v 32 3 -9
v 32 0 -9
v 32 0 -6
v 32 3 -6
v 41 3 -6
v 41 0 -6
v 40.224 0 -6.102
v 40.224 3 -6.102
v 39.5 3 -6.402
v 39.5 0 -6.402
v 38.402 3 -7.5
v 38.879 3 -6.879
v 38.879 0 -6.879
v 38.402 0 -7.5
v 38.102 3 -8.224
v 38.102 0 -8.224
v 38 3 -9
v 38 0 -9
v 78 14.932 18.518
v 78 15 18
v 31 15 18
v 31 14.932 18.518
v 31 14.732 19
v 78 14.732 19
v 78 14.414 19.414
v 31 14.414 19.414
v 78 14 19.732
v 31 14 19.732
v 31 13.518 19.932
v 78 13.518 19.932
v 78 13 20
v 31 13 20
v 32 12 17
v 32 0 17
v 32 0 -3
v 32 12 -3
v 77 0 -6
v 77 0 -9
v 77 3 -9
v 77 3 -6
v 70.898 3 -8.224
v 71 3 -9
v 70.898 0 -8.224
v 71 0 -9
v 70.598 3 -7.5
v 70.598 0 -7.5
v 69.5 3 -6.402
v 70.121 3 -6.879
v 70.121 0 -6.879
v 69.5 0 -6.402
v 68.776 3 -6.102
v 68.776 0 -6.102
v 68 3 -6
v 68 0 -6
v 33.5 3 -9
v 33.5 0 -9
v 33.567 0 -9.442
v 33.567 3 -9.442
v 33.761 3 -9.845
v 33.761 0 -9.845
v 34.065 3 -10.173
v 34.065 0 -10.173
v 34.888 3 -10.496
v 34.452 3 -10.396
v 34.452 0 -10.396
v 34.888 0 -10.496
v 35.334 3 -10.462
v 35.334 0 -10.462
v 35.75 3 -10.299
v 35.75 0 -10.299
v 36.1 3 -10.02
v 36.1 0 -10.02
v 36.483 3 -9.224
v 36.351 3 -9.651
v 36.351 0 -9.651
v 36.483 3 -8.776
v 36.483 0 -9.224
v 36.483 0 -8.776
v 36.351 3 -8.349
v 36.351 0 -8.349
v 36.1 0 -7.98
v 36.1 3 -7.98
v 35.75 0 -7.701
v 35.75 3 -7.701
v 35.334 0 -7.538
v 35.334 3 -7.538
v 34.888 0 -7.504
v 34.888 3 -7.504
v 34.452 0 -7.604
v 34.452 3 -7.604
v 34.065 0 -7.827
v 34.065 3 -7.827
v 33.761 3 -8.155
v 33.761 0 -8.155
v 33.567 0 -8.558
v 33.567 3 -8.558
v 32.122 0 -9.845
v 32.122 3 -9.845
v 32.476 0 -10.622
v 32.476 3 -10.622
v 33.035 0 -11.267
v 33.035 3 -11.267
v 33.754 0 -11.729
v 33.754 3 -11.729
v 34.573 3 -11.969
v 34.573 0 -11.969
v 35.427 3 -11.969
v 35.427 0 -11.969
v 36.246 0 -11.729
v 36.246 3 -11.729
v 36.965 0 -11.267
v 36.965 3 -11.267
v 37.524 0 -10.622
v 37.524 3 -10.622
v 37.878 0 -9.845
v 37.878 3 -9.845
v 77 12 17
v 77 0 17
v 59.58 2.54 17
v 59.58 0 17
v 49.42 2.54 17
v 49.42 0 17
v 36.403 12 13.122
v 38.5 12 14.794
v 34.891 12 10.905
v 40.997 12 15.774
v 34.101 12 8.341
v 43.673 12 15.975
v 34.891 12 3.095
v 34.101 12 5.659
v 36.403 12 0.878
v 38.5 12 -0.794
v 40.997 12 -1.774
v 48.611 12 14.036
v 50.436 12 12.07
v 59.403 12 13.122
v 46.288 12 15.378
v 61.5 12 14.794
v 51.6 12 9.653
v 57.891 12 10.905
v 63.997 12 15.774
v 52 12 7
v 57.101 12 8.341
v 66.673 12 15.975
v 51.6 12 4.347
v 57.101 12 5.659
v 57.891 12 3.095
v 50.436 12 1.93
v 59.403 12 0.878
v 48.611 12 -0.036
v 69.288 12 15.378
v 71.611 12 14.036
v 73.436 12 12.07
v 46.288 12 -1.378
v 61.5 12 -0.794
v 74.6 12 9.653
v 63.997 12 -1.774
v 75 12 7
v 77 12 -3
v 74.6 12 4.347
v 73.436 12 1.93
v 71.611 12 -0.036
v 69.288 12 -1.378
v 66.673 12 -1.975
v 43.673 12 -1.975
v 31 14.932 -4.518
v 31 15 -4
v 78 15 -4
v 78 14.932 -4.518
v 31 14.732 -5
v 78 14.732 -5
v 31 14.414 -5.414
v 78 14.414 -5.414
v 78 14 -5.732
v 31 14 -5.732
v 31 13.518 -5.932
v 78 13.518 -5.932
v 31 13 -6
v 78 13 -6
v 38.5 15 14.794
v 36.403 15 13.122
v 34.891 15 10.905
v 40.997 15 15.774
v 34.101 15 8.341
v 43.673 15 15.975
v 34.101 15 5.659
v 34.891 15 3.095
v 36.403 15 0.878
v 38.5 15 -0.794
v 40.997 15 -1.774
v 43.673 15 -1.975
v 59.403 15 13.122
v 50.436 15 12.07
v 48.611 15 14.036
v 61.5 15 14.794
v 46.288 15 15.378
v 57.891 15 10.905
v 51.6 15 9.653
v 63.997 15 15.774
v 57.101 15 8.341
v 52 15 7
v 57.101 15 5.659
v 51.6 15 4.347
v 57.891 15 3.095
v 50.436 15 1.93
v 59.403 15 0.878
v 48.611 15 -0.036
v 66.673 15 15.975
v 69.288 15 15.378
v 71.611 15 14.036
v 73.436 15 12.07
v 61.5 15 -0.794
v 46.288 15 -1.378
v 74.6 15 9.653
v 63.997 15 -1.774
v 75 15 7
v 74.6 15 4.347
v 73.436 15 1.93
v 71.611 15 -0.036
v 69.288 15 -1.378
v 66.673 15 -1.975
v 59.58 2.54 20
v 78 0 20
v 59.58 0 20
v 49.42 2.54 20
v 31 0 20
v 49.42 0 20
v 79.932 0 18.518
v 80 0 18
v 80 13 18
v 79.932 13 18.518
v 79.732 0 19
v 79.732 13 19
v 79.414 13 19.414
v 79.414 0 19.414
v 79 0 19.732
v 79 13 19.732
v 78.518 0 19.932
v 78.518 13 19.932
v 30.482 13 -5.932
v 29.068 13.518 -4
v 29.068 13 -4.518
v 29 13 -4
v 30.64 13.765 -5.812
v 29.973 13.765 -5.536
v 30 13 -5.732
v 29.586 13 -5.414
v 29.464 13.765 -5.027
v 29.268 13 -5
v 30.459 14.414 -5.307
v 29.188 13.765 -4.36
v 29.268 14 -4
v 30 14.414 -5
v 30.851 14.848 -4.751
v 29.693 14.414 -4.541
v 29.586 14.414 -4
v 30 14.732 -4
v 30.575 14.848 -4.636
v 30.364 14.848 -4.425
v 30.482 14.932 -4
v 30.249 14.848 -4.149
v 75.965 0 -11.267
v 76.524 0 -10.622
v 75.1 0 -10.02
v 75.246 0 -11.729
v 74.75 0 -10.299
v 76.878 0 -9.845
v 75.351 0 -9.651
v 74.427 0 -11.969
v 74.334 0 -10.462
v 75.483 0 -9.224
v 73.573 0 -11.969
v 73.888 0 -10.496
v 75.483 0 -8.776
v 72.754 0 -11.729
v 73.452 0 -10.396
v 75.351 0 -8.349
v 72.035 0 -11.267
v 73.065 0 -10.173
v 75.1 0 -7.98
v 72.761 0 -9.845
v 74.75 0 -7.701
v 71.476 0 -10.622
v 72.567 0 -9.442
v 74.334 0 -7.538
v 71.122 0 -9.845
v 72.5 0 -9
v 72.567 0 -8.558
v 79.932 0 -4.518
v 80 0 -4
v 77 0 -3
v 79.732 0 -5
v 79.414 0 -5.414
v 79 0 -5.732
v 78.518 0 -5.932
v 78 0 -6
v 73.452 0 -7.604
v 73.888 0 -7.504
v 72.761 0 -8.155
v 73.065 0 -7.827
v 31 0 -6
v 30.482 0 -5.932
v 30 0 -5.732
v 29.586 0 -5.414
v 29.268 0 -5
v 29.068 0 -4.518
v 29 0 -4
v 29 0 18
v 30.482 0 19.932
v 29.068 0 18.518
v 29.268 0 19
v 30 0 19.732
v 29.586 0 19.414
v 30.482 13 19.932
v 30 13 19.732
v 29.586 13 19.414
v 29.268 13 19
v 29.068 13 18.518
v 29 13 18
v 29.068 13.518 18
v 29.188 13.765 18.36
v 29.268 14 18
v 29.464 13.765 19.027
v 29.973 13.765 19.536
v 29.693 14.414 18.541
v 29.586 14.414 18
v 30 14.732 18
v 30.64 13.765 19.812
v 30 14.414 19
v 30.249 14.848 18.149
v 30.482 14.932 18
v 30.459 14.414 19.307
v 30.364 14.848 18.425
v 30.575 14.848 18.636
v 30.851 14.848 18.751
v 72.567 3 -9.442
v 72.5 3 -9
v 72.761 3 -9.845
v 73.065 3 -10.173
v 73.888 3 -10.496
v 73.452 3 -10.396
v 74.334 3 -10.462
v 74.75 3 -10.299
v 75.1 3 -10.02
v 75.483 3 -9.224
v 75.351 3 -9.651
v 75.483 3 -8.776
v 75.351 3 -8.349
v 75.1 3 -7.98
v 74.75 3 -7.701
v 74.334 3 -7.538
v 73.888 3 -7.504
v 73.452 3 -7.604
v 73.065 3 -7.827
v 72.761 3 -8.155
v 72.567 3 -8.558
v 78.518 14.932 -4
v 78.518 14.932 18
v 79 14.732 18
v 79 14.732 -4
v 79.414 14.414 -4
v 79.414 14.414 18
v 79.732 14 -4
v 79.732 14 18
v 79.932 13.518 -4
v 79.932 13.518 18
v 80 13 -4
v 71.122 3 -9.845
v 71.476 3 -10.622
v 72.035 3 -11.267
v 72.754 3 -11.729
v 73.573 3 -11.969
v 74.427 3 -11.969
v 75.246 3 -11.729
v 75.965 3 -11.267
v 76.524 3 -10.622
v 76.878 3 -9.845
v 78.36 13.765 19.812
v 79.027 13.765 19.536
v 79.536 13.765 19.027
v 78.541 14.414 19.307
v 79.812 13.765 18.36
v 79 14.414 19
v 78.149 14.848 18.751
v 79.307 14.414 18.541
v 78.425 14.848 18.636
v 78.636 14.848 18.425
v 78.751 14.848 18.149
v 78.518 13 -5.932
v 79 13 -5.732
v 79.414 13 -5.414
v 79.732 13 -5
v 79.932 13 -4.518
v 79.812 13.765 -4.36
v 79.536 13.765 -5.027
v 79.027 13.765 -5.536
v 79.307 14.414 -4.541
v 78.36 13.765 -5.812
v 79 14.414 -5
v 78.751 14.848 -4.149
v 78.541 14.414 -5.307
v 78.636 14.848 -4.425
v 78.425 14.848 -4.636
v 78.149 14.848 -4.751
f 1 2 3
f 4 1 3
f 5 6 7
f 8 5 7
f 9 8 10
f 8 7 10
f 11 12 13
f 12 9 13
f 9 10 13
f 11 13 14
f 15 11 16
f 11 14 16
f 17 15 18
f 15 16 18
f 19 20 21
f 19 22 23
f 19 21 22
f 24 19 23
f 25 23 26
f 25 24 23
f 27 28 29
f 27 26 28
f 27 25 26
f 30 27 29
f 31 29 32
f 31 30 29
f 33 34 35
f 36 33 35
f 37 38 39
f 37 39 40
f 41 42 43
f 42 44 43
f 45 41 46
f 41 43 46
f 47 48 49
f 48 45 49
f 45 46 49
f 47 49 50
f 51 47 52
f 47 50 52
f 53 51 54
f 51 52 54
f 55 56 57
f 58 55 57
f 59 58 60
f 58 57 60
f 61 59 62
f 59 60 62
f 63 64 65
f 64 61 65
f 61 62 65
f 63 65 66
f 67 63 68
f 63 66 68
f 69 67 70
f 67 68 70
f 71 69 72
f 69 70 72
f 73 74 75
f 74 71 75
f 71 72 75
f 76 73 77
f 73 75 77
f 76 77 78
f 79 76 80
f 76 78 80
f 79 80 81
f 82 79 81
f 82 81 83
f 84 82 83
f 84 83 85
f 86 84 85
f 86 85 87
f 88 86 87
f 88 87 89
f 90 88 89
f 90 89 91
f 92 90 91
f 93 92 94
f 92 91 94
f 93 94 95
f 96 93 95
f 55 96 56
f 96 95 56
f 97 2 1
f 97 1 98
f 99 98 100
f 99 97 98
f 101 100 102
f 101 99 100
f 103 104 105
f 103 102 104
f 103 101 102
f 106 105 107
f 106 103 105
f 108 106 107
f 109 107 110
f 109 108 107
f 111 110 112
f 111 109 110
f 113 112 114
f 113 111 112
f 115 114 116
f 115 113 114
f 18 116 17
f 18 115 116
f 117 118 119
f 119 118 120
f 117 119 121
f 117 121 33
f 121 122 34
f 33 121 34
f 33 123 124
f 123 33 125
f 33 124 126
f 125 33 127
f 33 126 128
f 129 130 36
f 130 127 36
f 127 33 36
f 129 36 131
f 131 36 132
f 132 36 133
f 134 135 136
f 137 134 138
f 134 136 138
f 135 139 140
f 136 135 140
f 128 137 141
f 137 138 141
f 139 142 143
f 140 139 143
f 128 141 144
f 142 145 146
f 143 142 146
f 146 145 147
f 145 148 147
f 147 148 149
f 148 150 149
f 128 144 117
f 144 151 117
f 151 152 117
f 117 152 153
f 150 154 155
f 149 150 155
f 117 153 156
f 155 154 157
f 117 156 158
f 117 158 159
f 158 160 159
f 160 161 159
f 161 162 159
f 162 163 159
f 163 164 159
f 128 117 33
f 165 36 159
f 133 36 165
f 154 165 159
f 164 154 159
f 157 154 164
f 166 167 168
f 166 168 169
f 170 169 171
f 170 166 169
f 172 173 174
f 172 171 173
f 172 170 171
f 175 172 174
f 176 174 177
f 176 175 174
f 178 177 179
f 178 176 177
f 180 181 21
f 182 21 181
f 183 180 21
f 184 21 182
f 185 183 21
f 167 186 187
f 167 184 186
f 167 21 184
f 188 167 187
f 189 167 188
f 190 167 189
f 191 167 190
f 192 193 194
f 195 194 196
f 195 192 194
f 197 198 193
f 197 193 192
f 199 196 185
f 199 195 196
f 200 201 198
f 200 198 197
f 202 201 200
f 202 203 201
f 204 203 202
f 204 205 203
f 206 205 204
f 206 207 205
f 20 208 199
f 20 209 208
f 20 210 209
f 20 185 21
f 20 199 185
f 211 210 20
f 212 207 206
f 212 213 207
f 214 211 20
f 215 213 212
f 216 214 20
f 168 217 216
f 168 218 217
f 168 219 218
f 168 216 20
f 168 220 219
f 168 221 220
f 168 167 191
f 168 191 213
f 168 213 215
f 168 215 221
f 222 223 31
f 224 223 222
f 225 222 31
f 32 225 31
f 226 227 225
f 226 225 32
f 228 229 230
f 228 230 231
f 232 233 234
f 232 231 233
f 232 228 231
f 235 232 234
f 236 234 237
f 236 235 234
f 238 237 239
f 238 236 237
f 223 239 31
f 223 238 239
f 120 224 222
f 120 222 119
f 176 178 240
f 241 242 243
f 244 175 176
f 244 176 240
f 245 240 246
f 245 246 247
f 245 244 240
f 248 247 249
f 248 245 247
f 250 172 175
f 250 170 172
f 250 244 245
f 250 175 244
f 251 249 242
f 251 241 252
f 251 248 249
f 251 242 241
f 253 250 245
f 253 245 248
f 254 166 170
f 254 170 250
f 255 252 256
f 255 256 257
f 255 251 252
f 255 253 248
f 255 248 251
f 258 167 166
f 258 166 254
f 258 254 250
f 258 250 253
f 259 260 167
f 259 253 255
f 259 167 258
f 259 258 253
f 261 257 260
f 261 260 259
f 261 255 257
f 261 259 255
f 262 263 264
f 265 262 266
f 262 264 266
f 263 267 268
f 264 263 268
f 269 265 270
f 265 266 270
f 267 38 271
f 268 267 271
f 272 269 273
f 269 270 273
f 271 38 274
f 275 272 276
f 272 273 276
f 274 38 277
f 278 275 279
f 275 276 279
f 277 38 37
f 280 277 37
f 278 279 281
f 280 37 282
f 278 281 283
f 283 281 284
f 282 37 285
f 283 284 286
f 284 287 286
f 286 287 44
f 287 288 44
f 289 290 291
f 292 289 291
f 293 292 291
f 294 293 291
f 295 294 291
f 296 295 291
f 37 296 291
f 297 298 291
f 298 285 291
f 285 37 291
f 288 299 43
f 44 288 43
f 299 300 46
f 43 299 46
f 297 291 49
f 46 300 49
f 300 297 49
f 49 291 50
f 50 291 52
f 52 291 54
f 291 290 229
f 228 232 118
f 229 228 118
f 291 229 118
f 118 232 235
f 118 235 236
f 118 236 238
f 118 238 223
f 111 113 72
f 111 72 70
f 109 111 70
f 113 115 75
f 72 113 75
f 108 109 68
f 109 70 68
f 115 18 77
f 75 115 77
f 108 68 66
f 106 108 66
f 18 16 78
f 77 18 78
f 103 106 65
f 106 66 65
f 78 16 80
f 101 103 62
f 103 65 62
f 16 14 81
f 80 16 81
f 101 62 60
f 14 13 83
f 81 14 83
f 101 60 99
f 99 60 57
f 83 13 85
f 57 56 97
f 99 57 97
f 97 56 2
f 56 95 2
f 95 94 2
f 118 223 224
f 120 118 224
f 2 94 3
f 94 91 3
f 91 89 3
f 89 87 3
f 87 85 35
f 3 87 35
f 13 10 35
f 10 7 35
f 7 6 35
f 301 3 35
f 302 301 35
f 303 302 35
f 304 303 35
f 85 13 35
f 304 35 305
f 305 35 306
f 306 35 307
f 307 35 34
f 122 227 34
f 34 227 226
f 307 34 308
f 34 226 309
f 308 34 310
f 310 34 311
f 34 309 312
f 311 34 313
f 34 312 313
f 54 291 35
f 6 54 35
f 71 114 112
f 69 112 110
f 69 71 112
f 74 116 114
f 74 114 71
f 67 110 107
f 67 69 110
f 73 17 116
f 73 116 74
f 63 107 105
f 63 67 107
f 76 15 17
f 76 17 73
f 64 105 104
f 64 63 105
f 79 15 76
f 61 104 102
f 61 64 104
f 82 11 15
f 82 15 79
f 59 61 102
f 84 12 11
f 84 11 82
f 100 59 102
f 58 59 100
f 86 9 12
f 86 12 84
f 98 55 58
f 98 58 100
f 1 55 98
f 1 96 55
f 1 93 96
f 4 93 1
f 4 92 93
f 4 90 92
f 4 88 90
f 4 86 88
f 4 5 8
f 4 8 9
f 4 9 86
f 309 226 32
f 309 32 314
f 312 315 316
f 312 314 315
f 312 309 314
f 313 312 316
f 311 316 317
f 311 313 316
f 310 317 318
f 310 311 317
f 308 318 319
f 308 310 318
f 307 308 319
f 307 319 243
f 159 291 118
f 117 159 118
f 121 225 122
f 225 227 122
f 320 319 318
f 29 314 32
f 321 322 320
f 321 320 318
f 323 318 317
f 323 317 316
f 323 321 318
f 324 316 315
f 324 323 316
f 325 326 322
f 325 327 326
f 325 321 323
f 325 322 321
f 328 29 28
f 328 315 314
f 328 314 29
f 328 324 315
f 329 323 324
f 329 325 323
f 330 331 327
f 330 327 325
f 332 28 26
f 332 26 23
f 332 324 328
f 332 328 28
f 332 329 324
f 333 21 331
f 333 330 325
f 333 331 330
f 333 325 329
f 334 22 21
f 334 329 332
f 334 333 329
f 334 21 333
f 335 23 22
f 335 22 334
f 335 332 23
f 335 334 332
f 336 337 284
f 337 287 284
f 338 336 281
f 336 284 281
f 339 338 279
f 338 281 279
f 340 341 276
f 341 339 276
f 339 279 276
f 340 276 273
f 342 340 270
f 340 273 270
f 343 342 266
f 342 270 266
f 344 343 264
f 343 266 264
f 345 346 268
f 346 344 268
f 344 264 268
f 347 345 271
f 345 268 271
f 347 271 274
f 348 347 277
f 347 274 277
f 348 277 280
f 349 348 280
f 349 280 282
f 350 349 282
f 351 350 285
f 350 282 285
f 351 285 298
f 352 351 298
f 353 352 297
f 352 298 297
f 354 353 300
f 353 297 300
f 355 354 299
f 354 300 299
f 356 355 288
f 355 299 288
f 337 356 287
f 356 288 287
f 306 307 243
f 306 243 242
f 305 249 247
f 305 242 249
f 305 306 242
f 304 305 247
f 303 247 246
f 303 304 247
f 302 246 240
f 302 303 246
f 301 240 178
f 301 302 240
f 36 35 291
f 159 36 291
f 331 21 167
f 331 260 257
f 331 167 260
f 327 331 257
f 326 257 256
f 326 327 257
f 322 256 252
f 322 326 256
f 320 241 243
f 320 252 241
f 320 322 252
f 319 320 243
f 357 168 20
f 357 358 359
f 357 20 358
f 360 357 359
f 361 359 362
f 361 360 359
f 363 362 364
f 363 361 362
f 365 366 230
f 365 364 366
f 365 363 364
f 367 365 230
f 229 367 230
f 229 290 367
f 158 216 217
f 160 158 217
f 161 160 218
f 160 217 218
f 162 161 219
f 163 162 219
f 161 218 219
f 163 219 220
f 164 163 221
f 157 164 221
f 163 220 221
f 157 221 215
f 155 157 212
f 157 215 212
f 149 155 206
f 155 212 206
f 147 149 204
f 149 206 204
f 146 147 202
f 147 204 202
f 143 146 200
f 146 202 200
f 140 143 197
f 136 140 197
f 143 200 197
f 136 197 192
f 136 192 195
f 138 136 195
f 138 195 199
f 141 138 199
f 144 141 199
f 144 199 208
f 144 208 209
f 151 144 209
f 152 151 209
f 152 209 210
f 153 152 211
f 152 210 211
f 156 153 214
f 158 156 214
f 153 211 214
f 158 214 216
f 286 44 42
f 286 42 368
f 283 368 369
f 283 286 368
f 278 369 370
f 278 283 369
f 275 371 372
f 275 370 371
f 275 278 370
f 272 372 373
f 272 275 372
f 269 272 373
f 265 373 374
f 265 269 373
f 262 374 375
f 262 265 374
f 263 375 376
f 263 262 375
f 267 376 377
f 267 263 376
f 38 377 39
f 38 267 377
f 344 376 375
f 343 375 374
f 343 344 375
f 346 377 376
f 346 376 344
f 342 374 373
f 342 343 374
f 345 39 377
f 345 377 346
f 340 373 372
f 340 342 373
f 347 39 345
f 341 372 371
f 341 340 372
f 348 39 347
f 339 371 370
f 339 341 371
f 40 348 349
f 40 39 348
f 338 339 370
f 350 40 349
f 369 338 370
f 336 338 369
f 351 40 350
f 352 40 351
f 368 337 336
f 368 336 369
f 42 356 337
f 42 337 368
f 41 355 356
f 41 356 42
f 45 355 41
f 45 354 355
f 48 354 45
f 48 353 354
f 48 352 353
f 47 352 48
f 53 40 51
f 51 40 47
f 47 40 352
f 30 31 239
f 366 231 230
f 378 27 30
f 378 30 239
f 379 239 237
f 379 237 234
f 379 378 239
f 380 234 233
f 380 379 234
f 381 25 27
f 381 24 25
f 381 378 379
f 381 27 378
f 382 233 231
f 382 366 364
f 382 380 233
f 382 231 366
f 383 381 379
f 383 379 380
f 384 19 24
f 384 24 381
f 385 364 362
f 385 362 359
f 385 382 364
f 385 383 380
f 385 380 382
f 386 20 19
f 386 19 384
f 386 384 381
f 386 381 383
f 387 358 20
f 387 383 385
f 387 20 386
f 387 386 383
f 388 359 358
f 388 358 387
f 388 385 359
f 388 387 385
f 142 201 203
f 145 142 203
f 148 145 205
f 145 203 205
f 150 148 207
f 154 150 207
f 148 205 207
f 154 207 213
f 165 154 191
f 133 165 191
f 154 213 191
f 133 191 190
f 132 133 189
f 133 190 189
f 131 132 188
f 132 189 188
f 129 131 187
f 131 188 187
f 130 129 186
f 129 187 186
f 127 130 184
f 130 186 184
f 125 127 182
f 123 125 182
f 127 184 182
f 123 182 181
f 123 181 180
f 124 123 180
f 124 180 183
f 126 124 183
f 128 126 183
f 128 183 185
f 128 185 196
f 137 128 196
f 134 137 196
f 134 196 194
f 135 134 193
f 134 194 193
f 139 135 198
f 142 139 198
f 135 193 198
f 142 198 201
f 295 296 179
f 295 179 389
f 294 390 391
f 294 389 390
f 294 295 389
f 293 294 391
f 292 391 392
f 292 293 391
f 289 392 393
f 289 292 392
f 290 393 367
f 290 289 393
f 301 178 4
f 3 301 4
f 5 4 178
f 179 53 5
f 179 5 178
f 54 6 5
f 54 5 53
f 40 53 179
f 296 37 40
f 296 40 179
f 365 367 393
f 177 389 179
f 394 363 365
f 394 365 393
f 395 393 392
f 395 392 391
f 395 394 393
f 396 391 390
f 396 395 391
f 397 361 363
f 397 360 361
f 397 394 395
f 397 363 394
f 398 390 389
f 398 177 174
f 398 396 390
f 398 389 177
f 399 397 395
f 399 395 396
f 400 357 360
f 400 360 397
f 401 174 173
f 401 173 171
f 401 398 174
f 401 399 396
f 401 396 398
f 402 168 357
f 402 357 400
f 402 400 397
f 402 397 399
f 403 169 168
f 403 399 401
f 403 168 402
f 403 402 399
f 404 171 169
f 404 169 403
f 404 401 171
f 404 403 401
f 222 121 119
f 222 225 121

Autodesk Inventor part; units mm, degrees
ref_plane "YZ Plane" through (0, 0, 0) normal (1, 0, 0) x (0, 1, 0)
ref_plane "XZ Plane" through (0, 0, 0) normal (0, 1, 0) x (-1, 0, 0)
ref_plane "XY Plane" through (0, 0, 0) normal (0, 0, 1) x (1, 0, 0)
sketch "Sketch1" plane through (0, 0, 0) normal (0, 1, 0) x (-1, 0, 0)
  line L0 (-77, 17) -> (-32, 17)
  line L1 (-32, 17) -> (-32, -3)
  line L2 (-32, -3) -> (-77, -3)
  line L3 (-77, -3) -> (-77, 17)
  line L4 (-78, 20) -> (-31, 20)
  line L5 (-29, 18) -> (-29, -4)
  line L6 (-41, -6) -> (-68, -6)
  line L7 (-80, -4) -> (-80, 18)
  arc A0 (-78, 20) -> (-80, 18) centre (-78, 18) ccw
  arc A1 (-29, 18) -> (-31, 20) centre (-31, 18) ccw
  arc A2 (-31, -6) -> (-29, -4) centre (-31, -4) ccw
  arc A3 (-80, -4) -> (-78, -6) centre (-78, -4) ccw
  line L8 (-77, -3) -> (-75.5, -3)
  line L9 (-75.5, -3) -> (-75.5, -1.5)
  circle A4 centre (-75.5, -1.5) radius 1
  line L10 (-32, 17) -> (-33.5, 17)
  line L11 (-33.5, 17) -> (-33.5, 15.5)
  circle A5 centre (-33.5, 15.5) radius 1
  line L12 (-49.42, 17) -> (-59.58, 17)
  line L13 (-59.58, 17) -> (-59.58, 14.46)
  line L14 (-59.58, 14.46) -> (-49.42, 14.46)
  line L15 (-49.42, 14.46) -> (-49.42, 17)
  line L16 (-78, -6) -> (-31, -6)
  line L17 (-77, -6) -> (-71, -6)
  line L18 (-71, -9) -> (-71, -9)
  line L19 (-74, -12) -> (-74, -12)
  line L20 (-77, -9) -> (-77, -6)
  line L21 (-32, -6) -> (-38, -6)
  line L22 (-38, -9) -> (-38, -9)
  line L23 (-35, -12) -> (-35, -12)
  line L24 (-32, -9) -> (-32, -6)
  arc A6 (-77, -9) -> (-74, -12) centre (-74, -9) ccw
  arc A7 (-74, -12) -> (-71, -9) centre (-74, -9) ccw
  arc A8 (-68, -6) -> (-71, -9) centre (-68, -9) ccw
  arc A9 (-38, -9) -> (-41, -6) centre (-41, -9) ccw
  arc A10 (-38, -9) -> (-35, -12) centre (-35, -9) ccw
  arc A11 (-35, -12) -> (-32, -9) centre (-35, -9) ccw
  circle A12 centre (-74, -9) radius 1.5
  circle A13 centre (-35, -9) radius 1.5
  line L25 (-77, -6) -> (-68, -6)
  line L26 (-41, -6) -> (-32, -6)
  point P0 (0, 0)
  point P1 (-38, -12)
  dimension "d44" = 45
  dimension "d45" = 20
  dimension "d46" = 2
  dimension "d47" = 1.5
  dimension "d48" = 1.5
  dimension "d49" = 2
  dimension "d50" = 1.5
  dimension "d51" = 1.5
  dimension "d52" = 2
  dimension "d53" = 10.16
  dimension "d54" = 2.54
  dimension "d55" = 3
  dimension "d56" = 3
  dimension "d57" = 3
extrude "Extrusion1" add sketch "Sketch1" along normal blind 3 contours L4 A1 L5 A2 L16 L6 A3 L7 A0 | L16 A8 A7 A6 L20 | L24 A11 A10 A9 L16
sketch "Sketch2" plane through (0, 3, 0) normal (0, 1, 0) x (1, 0, 0)
  line L0 (32, 3) -> (77, 3) projected
  line L1 (77, -17) -> (32, -17) projected
  line L2 (32, 3) -> (77, 3)
  line L3 (77, 3) -> (77, -17)
  line L4 (77, -17) -> (32, -17)
  line L5 (32, -17) -> (32, 3)
  line L6 (31, 6) -> (78, 6)
  line L7 (80, 4) -> (80, -18)
  line L8 (78, -20) -> (31, -20)
  line L9 (29, -18) -> (29, 4)
  arc A0 (31, 6) -> (29, 4) centre (31, 4) ccw
  arc A1 (80, 4) -> (78, 6) centre (78, 4) ccw
  arc A2 (78, -20) -> (80, -18) centre (78, -18) ccw
  arc A3 (29, -18) -> (31, -20) centre (31, -18) ccw
  point P0 (0, 0)
  dimension "d60" = 2
extrude "Extrusion2" add sketch "Sketch2" along normal blind 9
sketch "Sketch3" plane through (0, 12, 0) normal (0, 1, 0) x (1, 0, 0)
  line L0 (31, 6) -> (78, 6)
  line L1 (80, 4) -> (80, -18)
  line L2 (78, -20) -> (31, -20)
  line L3 (29, -18) -> (29, 4)
  arc A0 (31, 6) -> (29, 4) centre (31, 4) ccw
  arc A1 (80, 4) -> (78, 6) centre (78, 4) ccw
  arc A2 (78, -20) -> (80, -18) centre (78, -18) ccw
  arc A3 (29, -18) -> (31, -20) centre (31, -18) ccw
  point P0 (0, 0)
  dimension "d63" = 2
extrude "Extrusion3" add sketch "Sketch3" along normal blind 3
fillet "Fillet1" radius 2 8 edges at (29.5858, 15, -5.4142) (29, 15, 7) (29.5858, 15, 19.4142) (54.5, 15, 20) (79.4142, 15, 19.4142) (80, 15, 7) (79.4142, 15, -5.4142) (54.5, 15, -6)
sketch "Sketch4" plane through (0, 0, 0) normal (0, -1, 0) x (1, 0, 0)
  line L0 (31, 20) -> (78, 20) projected
  line L1 (54.5, 20) -> (49.42, 20)
  line L2 (49.42, 20) -> (59.58, 20)
  line L3 (59.58, 20) -> (59.58, 17)
  line L4 (77, 17) -> (32, 17) projected
  line L5 (49.42, 20) -> (49.42, 17)
  line L6 (49.42, 17) -> (59.58, 17)
  point P0 (0, 0)
  dimension "d67" = 5.08
  dimension "d68" = 10.16
extrude "Extrusion4" cut sketch "Sketch4" against normal blind 2.54
sketch "Sketch5" plane through (0, 15, 0) normal (0, 1, 0) x (1, 0, 0)
  line L0 (78, -18) -> (31, -18) projected
  line L1 (31, 4) -> (78, 4) projected
  circle A0 centre (43, -7) radius 9
  circle A1 centre (66, -7) radius 9
  point P0 (0, 0)
extrude "Extrusion5" cut sketch "Sketch5" against normal blind 3
